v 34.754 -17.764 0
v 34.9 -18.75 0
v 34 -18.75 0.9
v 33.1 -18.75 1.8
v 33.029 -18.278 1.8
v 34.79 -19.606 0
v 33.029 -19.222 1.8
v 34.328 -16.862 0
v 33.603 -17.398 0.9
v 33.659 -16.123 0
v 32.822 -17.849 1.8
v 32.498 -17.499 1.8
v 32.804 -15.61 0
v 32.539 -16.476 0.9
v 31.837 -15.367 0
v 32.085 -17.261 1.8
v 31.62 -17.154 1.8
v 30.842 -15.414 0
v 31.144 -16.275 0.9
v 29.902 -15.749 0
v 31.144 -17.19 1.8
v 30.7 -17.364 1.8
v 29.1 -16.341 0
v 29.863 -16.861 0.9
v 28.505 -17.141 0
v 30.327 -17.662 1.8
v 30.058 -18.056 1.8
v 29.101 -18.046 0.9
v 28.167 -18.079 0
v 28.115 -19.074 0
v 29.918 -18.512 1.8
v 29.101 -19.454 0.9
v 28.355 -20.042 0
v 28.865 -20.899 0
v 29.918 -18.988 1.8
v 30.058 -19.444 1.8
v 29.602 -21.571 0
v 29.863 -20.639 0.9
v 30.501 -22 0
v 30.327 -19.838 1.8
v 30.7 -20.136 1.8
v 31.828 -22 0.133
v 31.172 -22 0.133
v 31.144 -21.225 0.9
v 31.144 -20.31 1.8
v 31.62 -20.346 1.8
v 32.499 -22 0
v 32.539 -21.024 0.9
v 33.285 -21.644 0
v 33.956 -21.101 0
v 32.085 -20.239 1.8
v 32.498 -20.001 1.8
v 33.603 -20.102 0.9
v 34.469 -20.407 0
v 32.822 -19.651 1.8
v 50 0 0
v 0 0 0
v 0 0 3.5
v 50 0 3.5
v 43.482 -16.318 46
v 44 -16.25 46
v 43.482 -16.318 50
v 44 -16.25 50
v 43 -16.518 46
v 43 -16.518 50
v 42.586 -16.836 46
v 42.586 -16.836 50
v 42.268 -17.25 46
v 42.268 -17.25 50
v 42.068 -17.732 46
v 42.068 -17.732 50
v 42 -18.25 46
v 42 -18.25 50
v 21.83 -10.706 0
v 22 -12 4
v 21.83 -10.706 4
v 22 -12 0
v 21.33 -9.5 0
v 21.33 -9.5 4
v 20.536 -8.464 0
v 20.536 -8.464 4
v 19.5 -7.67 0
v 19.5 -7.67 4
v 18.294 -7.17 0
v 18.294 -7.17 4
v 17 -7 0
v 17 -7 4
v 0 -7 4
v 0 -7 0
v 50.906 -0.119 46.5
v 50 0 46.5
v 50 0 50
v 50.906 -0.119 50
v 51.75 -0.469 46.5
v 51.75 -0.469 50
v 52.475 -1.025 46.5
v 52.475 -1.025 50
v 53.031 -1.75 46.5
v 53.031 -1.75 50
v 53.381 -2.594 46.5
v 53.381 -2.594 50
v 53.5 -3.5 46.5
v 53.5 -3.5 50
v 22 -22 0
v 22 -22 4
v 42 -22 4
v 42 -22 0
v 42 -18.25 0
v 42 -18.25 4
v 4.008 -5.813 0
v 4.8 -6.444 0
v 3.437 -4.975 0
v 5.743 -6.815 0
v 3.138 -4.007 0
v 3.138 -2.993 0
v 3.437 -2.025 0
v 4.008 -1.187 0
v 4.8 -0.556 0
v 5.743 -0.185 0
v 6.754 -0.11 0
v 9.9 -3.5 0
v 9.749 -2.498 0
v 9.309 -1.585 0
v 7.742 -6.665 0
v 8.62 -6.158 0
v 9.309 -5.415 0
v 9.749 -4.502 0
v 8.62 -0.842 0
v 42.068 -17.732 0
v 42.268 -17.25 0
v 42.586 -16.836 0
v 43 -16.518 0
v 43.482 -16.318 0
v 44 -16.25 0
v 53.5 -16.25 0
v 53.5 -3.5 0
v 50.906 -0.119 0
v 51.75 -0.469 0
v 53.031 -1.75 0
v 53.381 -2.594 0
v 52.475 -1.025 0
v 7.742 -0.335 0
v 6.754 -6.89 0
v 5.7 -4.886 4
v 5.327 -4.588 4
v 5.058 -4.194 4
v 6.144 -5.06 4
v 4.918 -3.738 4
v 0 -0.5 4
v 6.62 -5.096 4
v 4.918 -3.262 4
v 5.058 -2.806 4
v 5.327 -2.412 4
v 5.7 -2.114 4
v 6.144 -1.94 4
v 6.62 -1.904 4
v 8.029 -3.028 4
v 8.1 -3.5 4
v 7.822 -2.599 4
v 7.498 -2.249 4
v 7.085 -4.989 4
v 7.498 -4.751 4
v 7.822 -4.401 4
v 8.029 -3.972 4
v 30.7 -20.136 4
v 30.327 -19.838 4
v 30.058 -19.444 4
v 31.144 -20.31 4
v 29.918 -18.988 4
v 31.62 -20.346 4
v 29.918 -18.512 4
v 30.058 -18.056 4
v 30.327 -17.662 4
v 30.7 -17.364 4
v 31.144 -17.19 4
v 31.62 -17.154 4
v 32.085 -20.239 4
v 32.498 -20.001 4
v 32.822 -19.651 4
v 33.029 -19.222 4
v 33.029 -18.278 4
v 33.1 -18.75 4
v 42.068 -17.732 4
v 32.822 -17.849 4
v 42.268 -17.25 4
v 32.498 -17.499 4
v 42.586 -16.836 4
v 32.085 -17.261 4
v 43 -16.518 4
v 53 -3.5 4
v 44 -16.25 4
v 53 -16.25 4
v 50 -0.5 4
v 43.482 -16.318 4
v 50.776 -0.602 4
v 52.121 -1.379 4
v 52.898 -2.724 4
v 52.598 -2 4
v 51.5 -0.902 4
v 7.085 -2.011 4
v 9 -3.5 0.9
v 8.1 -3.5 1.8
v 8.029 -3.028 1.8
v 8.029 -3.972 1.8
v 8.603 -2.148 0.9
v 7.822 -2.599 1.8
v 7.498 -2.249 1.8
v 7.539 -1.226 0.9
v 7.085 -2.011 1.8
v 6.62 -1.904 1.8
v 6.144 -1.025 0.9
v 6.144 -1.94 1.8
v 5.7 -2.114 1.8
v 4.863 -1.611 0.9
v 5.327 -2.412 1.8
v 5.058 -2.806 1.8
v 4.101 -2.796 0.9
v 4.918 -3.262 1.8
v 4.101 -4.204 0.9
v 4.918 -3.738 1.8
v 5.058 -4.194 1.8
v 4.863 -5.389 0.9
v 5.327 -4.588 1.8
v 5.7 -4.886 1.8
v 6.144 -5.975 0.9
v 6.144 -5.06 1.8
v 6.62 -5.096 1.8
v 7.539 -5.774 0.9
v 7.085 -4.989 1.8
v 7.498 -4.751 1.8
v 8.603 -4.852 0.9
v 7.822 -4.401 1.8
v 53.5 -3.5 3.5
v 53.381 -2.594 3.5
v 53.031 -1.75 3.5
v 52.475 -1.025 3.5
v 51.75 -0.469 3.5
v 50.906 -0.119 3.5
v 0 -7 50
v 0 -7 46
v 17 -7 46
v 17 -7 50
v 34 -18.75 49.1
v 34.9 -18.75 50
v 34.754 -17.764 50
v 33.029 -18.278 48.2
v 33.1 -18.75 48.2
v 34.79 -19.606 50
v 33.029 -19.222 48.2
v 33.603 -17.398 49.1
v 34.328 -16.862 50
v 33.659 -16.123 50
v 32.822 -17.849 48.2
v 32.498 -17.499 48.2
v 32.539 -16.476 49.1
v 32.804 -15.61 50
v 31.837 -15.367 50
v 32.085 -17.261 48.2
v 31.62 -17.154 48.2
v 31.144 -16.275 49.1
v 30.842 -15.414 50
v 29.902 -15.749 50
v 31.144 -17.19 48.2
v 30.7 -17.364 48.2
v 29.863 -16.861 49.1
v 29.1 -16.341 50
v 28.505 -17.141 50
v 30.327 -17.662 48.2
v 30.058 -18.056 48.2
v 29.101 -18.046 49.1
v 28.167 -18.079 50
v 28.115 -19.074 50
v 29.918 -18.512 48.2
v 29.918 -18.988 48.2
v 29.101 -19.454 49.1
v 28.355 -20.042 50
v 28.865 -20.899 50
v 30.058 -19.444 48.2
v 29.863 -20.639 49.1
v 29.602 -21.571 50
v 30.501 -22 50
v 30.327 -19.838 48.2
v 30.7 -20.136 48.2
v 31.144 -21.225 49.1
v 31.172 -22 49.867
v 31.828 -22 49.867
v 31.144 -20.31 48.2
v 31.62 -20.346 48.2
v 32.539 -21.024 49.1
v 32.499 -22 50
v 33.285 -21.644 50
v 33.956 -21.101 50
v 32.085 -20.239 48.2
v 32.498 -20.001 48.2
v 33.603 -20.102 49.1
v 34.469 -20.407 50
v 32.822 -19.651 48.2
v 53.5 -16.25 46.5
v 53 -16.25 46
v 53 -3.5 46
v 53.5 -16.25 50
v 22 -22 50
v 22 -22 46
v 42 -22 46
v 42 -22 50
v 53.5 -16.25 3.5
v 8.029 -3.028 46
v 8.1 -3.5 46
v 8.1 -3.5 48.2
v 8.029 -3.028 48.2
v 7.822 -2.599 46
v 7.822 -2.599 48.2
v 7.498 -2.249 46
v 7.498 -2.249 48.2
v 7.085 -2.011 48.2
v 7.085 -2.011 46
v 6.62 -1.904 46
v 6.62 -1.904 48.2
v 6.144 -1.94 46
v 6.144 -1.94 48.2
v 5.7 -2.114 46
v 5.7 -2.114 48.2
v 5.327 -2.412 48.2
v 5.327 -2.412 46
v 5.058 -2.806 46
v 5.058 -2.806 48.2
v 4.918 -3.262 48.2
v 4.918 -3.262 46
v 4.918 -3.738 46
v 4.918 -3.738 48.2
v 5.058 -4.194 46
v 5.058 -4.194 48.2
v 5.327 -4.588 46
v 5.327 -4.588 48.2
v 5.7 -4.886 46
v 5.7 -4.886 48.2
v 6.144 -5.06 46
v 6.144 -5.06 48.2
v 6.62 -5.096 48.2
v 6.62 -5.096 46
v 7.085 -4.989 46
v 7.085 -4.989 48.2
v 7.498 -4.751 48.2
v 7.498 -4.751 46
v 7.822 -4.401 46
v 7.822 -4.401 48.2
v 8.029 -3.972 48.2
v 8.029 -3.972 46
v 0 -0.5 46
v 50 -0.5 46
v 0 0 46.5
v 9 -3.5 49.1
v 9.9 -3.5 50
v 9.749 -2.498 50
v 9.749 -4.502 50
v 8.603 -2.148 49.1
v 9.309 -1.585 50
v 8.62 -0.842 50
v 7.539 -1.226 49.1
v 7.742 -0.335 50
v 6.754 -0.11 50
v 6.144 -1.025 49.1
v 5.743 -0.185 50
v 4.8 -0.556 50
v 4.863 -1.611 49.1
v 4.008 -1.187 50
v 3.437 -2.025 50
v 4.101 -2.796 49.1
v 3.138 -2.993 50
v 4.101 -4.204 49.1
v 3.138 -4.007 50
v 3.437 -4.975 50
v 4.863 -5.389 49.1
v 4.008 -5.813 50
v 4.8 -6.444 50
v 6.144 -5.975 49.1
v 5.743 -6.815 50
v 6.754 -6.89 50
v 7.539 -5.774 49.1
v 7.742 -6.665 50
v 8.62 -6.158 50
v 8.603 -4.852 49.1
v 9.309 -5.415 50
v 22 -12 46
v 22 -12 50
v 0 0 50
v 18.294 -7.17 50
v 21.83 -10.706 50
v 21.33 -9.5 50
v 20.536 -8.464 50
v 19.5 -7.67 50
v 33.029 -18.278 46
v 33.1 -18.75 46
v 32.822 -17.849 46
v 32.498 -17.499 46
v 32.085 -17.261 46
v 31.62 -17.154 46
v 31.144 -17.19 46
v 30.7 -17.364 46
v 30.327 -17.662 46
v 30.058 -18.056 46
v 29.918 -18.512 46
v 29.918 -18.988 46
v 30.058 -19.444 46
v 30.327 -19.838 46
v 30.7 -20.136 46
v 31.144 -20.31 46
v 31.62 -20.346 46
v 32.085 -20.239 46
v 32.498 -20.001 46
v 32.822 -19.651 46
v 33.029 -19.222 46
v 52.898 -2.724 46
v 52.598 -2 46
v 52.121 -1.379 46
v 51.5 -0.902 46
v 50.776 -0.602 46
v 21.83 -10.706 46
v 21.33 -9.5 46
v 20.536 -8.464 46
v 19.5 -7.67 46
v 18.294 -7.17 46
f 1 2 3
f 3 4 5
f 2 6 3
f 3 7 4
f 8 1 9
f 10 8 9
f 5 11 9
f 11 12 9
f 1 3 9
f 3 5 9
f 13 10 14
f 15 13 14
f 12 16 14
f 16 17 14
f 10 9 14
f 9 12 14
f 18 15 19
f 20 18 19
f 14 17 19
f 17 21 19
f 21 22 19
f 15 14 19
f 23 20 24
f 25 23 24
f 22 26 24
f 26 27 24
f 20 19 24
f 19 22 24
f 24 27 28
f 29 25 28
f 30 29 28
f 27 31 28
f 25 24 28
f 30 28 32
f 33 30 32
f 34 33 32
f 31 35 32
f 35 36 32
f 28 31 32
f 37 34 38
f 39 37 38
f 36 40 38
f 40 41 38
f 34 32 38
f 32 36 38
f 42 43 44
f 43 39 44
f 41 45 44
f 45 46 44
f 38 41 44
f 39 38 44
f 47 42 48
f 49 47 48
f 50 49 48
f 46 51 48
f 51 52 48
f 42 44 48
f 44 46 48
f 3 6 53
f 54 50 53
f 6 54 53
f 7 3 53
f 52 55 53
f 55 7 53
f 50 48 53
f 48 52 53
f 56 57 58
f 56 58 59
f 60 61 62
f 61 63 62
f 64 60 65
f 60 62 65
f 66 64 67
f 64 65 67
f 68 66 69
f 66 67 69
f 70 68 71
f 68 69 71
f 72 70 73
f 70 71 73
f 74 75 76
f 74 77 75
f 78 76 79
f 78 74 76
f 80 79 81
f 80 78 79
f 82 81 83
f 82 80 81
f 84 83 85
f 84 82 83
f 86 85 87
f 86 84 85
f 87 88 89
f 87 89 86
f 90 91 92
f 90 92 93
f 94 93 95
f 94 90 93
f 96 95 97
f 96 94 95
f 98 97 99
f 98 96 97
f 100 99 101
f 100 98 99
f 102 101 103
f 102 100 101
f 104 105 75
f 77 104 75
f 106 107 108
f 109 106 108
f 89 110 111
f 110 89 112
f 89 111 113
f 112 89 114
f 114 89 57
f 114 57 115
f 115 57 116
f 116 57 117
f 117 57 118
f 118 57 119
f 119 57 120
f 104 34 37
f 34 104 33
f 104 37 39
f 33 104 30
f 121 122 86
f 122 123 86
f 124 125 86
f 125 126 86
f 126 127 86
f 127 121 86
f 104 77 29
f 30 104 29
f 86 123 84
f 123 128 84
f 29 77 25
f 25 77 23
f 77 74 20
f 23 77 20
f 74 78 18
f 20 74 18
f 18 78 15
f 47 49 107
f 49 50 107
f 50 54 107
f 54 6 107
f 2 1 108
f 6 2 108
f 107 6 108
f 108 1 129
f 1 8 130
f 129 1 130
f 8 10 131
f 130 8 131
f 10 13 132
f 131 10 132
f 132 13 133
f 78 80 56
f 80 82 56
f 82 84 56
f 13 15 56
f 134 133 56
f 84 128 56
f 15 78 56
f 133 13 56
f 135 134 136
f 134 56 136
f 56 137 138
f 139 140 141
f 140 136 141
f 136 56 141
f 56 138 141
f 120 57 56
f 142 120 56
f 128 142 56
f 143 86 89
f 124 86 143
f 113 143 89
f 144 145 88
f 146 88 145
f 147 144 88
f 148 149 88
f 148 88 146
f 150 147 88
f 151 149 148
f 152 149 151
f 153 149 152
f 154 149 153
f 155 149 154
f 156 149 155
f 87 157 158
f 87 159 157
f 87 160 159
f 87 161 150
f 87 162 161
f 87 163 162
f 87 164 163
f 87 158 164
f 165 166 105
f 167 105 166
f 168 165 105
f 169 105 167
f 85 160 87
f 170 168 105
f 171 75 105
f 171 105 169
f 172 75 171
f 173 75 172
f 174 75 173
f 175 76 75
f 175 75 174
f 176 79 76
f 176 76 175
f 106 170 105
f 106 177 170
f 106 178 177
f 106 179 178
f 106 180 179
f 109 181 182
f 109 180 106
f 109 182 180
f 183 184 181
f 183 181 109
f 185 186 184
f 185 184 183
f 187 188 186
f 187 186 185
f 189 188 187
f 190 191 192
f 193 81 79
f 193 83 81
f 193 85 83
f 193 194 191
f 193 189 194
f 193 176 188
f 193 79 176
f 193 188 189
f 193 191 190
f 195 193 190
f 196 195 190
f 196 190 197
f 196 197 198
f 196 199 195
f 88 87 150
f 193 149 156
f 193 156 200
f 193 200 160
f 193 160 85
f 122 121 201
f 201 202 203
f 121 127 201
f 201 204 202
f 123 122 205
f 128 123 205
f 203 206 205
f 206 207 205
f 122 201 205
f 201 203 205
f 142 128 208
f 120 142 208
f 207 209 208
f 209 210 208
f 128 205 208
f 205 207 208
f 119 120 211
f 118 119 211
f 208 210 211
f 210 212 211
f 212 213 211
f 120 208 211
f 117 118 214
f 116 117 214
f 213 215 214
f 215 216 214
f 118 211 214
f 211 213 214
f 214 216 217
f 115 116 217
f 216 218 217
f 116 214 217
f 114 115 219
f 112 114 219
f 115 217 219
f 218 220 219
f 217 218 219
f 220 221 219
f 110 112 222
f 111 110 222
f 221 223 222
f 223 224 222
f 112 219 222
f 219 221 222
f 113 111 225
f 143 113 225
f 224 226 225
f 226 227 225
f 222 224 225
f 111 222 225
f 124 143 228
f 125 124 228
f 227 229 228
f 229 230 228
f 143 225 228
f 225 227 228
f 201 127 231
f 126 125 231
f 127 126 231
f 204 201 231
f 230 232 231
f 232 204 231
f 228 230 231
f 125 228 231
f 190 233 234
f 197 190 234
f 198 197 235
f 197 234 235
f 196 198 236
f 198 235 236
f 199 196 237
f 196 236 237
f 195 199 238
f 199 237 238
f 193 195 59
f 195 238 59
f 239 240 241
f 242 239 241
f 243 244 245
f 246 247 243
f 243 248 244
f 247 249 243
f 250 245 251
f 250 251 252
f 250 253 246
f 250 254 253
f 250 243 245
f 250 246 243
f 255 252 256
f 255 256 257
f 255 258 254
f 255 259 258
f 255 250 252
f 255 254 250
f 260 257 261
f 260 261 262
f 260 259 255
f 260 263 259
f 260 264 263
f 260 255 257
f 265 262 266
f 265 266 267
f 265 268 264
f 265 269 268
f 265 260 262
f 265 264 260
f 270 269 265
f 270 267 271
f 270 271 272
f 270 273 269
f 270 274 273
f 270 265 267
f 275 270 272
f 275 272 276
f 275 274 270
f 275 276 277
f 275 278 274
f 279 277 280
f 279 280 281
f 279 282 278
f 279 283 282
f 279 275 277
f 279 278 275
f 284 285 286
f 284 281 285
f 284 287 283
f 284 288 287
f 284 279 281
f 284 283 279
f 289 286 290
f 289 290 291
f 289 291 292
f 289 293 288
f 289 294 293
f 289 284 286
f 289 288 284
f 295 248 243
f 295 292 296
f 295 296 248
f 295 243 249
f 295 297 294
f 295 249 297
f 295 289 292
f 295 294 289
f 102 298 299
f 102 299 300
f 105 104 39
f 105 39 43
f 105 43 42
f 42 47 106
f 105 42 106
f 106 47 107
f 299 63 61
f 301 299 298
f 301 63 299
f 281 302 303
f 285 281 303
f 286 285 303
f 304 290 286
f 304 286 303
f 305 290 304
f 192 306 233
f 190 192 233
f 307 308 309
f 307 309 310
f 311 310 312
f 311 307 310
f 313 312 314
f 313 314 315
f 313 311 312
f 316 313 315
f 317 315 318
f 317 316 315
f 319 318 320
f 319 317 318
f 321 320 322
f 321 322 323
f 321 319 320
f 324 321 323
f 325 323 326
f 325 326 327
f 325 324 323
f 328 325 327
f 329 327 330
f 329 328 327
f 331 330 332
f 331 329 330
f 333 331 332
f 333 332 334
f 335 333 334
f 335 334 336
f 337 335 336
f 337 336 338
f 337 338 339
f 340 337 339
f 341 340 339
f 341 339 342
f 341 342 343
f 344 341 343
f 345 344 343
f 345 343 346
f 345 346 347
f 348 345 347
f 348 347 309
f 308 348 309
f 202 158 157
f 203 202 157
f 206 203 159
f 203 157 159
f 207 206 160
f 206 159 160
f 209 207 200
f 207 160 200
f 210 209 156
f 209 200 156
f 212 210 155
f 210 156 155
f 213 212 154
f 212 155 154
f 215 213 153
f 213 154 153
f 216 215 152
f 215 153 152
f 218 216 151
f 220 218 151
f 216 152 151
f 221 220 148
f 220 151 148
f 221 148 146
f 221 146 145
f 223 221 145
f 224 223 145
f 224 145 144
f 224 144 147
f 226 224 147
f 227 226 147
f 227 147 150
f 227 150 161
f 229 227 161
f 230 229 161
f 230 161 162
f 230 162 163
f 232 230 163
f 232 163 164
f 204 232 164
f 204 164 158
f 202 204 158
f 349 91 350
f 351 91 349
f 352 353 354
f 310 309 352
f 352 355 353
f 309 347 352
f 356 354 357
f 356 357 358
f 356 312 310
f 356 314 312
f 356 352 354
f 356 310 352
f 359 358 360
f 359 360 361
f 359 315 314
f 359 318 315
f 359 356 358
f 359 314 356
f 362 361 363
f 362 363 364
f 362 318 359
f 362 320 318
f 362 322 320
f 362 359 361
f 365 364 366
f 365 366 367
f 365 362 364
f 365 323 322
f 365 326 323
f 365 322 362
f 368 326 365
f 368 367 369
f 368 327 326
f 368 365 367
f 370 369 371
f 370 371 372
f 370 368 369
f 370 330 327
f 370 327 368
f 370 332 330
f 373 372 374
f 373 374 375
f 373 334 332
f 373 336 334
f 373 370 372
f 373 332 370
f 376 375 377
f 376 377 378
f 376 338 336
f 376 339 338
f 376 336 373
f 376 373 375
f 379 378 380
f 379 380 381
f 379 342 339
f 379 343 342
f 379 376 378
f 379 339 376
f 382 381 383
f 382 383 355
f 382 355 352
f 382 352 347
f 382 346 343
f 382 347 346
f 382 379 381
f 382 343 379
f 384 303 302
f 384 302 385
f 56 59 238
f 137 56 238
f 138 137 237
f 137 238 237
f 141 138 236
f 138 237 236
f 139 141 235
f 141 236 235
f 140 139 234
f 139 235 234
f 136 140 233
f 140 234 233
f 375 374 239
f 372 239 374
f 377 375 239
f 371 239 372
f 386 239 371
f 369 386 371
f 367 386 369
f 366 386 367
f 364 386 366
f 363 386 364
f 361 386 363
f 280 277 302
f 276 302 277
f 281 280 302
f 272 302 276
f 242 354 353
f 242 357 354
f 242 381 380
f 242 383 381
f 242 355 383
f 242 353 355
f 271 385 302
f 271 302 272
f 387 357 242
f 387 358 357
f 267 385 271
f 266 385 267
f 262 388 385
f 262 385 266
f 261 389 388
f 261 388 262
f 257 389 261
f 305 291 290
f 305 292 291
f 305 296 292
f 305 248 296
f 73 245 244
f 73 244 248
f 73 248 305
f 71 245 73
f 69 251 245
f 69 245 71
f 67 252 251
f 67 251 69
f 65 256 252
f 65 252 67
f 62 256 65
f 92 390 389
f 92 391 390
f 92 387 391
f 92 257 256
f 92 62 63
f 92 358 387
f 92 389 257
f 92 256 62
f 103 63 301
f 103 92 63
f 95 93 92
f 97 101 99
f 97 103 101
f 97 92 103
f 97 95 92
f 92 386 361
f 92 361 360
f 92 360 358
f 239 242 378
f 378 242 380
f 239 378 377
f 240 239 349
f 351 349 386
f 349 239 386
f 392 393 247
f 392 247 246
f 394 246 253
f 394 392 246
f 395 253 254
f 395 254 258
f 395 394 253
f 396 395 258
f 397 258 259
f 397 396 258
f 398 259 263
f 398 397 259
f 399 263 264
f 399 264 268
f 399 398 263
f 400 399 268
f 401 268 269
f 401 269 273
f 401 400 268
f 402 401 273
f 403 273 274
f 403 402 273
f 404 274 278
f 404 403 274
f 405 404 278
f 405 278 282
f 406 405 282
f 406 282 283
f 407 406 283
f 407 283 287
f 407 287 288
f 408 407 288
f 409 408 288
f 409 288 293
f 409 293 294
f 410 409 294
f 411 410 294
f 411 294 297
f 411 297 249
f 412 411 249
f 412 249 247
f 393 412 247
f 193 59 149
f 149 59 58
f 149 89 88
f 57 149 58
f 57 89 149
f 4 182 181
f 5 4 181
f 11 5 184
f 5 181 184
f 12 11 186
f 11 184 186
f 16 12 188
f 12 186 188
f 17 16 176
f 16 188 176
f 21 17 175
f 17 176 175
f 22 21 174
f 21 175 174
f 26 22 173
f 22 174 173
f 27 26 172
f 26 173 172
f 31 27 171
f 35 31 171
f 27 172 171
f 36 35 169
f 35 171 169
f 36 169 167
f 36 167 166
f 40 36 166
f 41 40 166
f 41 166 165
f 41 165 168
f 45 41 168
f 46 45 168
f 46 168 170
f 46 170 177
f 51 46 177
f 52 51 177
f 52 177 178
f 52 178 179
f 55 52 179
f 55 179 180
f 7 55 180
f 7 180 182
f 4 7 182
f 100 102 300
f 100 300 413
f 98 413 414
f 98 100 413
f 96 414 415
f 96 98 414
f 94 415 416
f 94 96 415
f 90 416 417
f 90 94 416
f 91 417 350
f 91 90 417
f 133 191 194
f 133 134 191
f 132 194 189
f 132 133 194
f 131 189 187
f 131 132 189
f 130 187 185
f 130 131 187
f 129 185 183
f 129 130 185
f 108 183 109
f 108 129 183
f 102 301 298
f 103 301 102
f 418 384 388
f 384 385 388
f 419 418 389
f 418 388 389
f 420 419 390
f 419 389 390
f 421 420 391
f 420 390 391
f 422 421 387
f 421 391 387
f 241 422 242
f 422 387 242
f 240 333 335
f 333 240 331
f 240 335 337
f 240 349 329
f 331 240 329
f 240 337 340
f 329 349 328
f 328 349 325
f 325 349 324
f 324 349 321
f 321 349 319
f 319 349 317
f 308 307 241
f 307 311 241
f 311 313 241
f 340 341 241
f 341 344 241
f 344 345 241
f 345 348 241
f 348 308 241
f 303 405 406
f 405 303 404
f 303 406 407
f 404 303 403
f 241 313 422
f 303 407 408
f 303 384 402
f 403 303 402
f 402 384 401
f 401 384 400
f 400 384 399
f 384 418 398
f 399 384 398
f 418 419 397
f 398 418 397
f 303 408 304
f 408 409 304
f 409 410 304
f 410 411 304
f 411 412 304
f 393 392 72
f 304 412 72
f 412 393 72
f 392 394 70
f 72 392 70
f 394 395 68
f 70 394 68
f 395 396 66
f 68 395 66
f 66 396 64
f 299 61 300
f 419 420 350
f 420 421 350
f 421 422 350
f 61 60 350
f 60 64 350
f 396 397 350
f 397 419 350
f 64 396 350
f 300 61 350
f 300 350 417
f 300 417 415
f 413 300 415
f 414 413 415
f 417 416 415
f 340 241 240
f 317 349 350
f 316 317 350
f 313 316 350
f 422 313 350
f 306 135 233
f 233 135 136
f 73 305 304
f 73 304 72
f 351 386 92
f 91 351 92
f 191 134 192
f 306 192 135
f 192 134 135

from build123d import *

# Parameters (mm, degrees)
F0_W      = 42
F0_H      = 22
F1_DEPTH  = 4
F2_W      = 29
F2_H      = 16.25
F3_DEPTH  = 4
F4_R      = 3.5
F5_R      = 2
F6_R      = 1.6
F7_DEPTH  = 25
F8_W      = 22
F8_H      = 15
F9_DEPTH  = 25
F10_R     = 5
F11_R     = 1.6
F12_DEPTH = 25
F15_SIZE  = 0.5


# Not quite as in the source:
# - a fillet or chamfer that OpenCascade refuses, or shapes differently, is made with other operations: its cross-section is extruded or revolved along the edge and cut away or added


with BuildPart() as f1:
    # F0 (on Top) → F1 (new body)
    with BuildSketch(Plane.XY):
        with Locations((21, -11)):
            Rectangle(F0_W, F0_H)
    extrude(amount=F1_DEPTH)

    # F2 (on Top) → F3 (join)
    with BuildSketch(Plane.XY):
        with Locations((39, -8.125)):
            Rectangle(F2_W, F2_H)
    extrude(amount=F3_DEPTH)

    # F4
    f4_edges = [f1.edges().sort_by_distance(p)[0] for p in [
        (53.5, 0, 2),
    ]]
    fillet(f4_edges, radius=F4_R)

    # F5
    f5_edges = [f1.edges().sort_by_distance(p)[0] for p in [
        (42, -16.25, 2),
    ]]
    fillet(f5_edges, radius=F5_R)

    # F6 (on face) → F7 (cut)
    with BuildSketch(Plane.XY.offset(4)):
        with Locations((6.5, -3.5)):
            Circle(F6_R)
    extrude(amount=-F7_DEPTH, mode=Mode.SUBTRACT)

    # F8 (on face) → F9 (cut)
    with BuildSketch(Plane.XY.offset(4)):
        with Locations((11, -14.5)):
            Rectangle(F8_W, F8_H)
    extrude(amount=-F9_DEPTH, mode=Mode.SUBTRACT)

    # F10
    f10_edges = [f1.edges().sort_by_distance(p)[0] for p in [
        (22, -7, 2),
    ]]
    fillet(f10_edges, radius=F10_R)

    # F11 (on face) → F12 (cut)
    with BuildSketch(Plane.XY.offset(4)):
        with Locations((31.5, -18.75)):
            Circle(F11_R)
    extrude(amount=-F12_DEPTH, mode=Mode.SUBTRACT)

    # F14: chamfer of 1.8 on 2 edges, made by hand

    # F14_s1 → F14_t2 (revolve, cut)
    with BuildSketch(Plane.XZ.offset(18.75)):
        Polygon((34.9, 0), (33.1, 1.8), (33.1, 0), align=None)
    revolve(axis=Axis((31.5, -18.75, 0), (0, 0, 1)), mode=Mode.SUBTRACT)

    # F14_s3 → F14_t4 (revolve, cut)
    with BuildSketch(Plane.XZ.offset(3.5)):
        Polygon((9.9, 0), (8.1, 1.8), (8.1, 0), align=None)
    revolve(axis=Axis((6.5, -3.5, 0), (0, 0, 1)), mode=Mode.SUBTRACT)

    # F15
    f15_edges = [f1.edges().sort_by_distance(p)[0] for p in [
        (53.5, -9.875, 4),
        (52.474874, -1.025126, 4),
        (25, 0, 4),
    ]]
    chamfer(f15_edges, length=F15_SIZE)


with BuildPart() as f16_1:
    # F16: instance of F1
    add(f1.part.mirror(Plane.XY.offset(25)))


solid = Compound([f1.part, f16_1.part])
